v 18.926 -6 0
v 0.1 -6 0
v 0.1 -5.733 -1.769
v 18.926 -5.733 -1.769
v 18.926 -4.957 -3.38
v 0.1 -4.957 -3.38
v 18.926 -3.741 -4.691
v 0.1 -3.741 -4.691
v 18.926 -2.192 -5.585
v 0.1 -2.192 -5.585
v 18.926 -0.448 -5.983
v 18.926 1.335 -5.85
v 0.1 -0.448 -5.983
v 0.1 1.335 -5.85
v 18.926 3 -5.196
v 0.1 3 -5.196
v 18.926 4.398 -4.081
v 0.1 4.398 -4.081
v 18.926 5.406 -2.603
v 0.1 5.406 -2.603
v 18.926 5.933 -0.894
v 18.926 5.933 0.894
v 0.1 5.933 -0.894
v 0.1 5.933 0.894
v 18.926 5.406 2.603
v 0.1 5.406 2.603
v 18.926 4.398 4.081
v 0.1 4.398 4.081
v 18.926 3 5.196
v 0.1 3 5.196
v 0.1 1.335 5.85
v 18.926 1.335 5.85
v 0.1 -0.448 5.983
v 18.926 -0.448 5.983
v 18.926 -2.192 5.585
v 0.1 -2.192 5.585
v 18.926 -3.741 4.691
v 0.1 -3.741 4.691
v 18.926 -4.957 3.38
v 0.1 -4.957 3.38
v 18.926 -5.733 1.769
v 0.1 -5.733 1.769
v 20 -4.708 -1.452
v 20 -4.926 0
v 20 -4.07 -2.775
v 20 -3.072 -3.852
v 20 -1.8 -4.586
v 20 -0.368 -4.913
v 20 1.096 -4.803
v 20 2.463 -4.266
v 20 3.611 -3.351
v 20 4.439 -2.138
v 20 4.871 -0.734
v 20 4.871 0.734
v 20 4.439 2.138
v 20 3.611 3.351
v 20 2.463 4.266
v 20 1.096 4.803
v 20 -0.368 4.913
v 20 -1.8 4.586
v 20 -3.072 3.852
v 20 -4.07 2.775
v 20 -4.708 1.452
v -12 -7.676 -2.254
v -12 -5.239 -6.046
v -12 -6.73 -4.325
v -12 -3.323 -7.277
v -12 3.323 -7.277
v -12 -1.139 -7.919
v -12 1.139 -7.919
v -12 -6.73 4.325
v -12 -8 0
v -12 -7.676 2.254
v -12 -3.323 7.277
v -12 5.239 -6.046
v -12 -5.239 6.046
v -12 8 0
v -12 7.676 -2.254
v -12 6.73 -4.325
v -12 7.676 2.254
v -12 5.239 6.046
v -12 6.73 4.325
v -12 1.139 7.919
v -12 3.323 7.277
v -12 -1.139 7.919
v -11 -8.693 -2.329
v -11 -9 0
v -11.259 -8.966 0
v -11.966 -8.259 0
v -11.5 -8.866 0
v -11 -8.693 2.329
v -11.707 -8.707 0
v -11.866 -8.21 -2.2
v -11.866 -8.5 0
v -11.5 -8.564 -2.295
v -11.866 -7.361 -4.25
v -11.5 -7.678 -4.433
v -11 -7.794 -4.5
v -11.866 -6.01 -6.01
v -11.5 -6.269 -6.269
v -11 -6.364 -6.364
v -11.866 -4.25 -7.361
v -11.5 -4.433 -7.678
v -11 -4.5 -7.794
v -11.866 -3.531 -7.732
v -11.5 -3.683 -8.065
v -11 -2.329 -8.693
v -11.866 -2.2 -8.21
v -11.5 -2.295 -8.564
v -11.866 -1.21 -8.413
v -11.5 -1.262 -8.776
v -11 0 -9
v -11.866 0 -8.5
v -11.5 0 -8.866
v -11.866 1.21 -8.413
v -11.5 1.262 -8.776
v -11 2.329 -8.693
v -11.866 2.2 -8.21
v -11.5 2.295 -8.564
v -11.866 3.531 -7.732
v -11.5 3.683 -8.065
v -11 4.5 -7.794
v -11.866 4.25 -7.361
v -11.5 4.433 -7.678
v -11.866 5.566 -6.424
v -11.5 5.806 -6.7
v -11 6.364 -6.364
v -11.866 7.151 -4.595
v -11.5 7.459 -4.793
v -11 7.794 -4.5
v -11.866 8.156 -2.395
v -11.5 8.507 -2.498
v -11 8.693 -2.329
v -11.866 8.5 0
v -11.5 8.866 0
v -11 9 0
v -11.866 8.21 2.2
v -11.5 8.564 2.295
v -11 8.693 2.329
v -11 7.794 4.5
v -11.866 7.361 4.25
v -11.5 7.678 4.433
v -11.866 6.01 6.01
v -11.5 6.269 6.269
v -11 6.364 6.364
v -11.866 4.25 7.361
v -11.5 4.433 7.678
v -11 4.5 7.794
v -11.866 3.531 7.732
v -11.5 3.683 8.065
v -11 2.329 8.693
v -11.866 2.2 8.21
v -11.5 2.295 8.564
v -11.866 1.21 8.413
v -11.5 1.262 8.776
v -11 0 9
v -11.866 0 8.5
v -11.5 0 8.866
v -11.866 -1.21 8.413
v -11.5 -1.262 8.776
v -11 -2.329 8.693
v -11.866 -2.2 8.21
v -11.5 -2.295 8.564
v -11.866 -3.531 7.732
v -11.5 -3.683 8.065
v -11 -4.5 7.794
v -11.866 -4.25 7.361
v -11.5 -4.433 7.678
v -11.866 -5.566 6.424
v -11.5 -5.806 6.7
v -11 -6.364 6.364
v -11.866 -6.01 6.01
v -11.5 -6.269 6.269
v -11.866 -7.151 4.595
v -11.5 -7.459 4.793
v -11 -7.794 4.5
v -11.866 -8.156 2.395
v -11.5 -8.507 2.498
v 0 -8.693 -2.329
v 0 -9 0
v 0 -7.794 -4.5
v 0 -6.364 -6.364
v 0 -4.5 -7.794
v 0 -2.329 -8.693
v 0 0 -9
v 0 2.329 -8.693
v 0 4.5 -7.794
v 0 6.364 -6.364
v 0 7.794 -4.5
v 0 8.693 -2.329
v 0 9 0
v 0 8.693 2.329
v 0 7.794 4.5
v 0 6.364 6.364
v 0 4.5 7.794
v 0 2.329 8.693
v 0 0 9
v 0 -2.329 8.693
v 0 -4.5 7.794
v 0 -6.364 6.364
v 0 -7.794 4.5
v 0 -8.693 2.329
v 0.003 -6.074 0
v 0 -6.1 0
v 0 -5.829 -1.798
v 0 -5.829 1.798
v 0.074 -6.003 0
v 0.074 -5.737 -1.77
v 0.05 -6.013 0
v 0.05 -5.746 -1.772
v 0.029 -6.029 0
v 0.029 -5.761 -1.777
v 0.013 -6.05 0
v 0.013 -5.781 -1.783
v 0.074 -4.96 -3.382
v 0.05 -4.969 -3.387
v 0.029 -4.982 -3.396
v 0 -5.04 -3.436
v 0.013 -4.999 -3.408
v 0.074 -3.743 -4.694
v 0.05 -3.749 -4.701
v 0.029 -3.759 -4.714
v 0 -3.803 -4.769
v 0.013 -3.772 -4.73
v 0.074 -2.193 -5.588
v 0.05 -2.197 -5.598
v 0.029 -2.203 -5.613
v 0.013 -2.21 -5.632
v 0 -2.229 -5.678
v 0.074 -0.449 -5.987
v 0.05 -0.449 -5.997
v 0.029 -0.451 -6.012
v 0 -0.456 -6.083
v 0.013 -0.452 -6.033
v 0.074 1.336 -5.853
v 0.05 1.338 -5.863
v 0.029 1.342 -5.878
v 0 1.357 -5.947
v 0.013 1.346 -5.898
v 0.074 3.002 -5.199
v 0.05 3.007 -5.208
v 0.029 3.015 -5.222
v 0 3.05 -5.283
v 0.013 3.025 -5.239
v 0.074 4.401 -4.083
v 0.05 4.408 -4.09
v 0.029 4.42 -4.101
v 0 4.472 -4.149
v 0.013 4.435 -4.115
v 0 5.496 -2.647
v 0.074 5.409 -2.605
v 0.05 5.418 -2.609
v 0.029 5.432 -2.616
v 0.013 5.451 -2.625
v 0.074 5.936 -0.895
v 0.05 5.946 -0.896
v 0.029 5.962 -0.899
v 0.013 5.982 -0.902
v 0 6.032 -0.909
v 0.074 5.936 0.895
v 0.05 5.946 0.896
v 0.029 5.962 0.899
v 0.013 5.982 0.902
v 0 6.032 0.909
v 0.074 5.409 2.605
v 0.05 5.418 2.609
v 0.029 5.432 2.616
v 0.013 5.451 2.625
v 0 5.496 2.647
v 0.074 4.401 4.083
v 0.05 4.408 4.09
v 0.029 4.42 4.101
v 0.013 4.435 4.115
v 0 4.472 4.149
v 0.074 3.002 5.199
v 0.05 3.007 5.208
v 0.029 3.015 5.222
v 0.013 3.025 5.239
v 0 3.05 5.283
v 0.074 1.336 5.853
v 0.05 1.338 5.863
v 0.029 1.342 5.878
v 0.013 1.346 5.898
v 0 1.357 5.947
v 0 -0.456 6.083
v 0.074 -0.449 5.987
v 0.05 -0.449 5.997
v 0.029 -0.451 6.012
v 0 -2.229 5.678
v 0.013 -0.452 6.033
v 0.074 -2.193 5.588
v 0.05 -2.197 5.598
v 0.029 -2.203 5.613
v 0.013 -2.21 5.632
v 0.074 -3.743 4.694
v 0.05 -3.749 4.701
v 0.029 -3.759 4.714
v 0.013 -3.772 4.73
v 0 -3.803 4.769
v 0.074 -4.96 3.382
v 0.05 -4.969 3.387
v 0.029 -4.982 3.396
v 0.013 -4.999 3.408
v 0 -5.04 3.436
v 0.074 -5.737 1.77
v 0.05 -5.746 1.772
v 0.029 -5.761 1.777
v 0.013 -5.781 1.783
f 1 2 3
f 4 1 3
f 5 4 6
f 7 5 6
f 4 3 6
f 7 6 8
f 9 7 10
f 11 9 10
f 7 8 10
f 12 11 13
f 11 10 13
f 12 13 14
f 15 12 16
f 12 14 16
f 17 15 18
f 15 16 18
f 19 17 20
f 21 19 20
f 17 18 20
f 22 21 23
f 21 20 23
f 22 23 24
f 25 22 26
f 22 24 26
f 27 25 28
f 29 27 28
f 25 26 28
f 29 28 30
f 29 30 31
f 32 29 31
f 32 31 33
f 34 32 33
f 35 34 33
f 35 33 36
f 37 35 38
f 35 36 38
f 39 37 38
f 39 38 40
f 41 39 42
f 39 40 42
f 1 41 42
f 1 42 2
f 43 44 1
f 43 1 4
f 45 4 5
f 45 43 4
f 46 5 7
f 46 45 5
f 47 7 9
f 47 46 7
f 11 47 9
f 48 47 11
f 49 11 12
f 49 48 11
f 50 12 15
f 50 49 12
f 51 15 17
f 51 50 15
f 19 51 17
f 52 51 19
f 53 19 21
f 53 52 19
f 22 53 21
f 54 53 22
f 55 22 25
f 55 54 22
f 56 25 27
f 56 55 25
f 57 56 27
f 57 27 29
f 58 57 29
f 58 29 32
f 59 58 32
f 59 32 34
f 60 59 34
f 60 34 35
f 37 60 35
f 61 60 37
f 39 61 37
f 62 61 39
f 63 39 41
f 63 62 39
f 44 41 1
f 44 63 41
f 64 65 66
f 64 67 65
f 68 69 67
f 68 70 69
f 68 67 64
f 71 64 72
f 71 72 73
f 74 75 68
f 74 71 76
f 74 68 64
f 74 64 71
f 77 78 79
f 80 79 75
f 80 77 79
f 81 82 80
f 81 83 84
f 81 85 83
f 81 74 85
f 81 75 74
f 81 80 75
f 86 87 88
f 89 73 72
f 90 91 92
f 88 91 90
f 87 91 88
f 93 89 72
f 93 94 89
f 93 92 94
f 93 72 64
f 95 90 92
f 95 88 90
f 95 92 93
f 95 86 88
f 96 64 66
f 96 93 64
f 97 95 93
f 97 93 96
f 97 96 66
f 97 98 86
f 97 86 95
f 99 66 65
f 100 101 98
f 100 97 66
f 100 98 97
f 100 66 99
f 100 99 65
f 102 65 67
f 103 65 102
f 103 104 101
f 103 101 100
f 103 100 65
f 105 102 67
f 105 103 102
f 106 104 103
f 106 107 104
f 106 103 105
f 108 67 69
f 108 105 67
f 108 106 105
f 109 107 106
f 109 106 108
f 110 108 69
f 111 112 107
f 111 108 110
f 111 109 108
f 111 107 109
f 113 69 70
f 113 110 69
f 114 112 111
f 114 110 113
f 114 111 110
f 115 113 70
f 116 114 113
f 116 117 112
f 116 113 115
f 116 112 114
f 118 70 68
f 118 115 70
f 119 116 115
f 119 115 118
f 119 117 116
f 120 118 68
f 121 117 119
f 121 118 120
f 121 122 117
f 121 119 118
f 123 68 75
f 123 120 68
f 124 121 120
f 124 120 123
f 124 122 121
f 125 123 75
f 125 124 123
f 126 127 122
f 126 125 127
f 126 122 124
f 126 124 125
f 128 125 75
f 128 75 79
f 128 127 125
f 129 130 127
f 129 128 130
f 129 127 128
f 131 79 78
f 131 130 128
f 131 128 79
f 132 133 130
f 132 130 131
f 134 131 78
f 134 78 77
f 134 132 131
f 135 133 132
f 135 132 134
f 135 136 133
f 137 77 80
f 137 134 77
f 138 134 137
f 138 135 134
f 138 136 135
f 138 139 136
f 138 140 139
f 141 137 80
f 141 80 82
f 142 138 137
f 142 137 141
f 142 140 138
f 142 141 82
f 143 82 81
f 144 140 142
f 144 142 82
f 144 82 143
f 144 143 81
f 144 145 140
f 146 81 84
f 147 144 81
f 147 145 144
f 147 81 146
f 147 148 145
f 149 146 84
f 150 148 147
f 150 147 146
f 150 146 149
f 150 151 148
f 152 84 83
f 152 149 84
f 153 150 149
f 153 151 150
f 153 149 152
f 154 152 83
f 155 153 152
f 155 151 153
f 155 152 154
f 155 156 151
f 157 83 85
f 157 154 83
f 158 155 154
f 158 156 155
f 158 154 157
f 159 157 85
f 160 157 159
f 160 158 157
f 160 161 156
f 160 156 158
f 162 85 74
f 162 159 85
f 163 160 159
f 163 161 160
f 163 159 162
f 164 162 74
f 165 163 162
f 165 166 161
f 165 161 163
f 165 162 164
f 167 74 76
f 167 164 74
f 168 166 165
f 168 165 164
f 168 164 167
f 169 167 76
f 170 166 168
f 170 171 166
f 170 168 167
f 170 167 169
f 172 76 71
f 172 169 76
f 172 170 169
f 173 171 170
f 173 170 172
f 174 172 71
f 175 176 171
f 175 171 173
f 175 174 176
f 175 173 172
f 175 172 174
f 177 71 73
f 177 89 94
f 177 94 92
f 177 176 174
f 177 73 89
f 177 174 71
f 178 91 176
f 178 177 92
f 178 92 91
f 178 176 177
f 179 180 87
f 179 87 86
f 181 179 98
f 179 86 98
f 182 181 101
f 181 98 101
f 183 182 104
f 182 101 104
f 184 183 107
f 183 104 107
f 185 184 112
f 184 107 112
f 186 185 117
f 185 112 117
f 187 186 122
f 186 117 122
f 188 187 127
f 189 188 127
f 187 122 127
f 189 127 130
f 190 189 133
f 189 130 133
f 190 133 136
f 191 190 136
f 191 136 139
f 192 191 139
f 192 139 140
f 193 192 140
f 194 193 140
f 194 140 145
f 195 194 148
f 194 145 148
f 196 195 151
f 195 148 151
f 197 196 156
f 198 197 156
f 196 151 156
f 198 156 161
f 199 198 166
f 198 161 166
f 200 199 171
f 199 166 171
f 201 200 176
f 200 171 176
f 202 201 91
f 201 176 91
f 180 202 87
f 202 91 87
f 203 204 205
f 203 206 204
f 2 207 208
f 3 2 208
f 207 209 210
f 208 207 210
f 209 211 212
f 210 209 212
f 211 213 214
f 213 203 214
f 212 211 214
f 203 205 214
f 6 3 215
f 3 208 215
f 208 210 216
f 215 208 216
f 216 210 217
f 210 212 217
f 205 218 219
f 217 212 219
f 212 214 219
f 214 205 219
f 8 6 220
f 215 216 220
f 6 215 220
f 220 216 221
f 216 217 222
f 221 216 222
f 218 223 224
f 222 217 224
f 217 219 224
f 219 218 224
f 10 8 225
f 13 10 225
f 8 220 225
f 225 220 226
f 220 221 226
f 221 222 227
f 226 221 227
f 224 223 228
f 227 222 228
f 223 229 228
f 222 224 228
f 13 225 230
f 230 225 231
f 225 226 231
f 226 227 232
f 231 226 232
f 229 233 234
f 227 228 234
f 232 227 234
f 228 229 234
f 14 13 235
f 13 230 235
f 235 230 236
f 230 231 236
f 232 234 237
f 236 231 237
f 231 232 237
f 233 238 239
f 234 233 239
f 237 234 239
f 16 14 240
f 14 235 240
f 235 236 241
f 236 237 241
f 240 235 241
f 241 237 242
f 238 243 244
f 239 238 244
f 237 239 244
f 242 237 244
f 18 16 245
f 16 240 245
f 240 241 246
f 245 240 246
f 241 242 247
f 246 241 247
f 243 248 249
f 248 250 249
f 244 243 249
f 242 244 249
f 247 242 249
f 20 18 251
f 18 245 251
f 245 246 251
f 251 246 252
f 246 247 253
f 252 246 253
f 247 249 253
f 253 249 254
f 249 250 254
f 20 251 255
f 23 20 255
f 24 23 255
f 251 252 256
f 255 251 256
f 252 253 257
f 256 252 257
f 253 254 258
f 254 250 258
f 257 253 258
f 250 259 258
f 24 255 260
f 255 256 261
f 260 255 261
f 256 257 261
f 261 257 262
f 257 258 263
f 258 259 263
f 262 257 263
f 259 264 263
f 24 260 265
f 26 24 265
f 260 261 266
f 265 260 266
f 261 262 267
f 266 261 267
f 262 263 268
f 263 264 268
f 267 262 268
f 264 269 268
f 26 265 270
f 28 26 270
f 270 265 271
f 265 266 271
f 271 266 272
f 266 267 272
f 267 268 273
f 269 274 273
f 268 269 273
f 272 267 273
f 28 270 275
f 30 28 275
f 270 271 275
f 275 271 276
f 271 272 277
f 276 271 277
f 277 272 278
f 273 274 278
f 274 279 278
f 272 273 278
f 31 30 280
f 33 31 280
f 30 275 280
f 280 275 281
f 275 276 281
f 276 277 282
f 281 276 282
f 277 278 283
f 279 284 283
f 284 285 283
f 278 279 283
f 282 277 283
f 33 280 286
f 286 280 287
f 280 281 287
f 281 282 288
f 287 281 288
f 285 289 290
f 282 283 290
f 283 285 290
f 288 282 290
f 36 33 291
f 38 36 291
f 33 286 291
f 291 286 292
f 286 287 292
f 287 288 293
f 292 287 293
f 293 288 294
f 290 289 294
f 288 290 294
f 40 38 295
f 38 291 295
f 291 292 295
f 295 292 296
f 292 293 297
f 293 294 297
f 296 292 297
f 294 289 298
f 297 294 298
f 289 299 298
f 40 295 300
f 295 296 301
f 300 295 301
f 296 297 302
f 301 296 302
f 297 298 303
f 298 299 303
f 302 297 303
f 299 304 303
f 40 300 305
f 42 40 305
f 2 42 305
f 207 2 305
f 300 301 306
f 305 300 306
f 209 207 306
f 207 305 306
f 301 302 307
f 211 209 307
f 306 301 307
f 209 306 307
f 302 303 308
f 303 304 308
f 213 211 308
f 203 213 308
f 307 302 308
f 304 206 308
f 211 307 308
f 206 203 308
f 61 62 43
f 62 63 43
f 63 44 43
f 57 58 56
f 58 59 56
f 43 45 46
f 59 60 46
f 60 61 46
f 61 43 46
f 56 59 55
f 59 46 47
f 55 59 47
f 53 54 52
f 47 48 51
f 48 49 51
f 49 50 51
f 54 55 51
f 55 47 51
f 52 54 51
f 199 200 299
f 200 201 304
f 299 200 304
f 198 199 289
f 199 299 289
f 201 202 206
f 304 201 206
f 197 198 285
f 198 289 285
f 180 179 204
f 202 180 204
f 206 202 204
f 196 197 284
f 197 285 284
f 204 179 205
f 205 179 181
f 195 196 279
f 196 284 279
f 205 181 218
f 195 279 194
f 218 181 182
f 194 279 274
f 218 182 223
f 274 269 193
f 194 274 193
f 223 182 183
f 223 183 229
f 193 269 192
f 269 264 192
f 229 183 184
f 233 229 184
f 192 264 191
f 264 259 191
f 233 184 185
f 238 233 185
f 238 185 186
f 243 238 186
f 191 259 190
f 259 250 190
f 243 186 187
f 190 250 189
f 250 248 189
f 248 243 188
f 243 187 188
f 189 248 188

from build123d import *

# Parameters (mm, degrees)
EXTRUDE_562_REACH = 36.438
SKETCH_2_R        = 5.773502692
FILLET_616_R      = 1
CHAMFER_1_SIZE    = 1.0735375
FILLET_2_R        = 0.1


with BuildPart() as part:
    # 草圖1 → Revolve 435 (revolve)
    with BuildSketch(Plane.XY, mode=Mode.PRIVATE) as revolve_435_sk:
        Polygon((-2.066666667, 0), (20, 0), (20, 6), (4.3, 6), (3.2263625, 6), (0, 6), (0, 9), (-12, 9), (-12, 5.773502692), (-5.4, 5.773502692), align=None)
    revolve(revolve_435_sk.sketch.rotate(Axis((-2.066666667, 0, 0), (1, 0, 0)), 180), axis=Axis((-2.066666667, 0, 0), (1, 0, 0)))

    # 草圖2 → Extrude 562 (add, up to next)
    with BuildSketch(Plane.ZY.offset(12), mode=Mode.PRIVATE) as extrude_562_sk1:
        Circle(SKETCH_2_R)
    extrude_562_tool1 = extrude(extrude_562_sk1.sketch, amount=-EXTRUDE_562_REACH, mode=Mode.PRIVATE) - part.part
    # 草圖2 → Extrude 562 (add, up to next)
    with BuildSketch(Plane.ZY.offset(12), mode=Mode.PRIVATE) as extrude_562_sk2:
        Polygon((5.773502692, 0), (2.886751346, -5), (-2.886751346, -5), (-5.773502692, 0), (-2.886751346, 5), (2.886751346, 5), align=None)
    extrude_562_tool2 = extrude(extrude_562_sk2.sketch, amount=-EXTRUDE_562_REACH, mode=Mode.PRIVATE) - part.part
    add(extrude_562_tool1.solids().sort_by_distance((-12, 0, 0))[0])
    add(extrude_562_tool2.solids().sort_by_distance((-12, 0, 0))[0])

    # Fillet 616
    fillet_616_edges = [part.edges().sort_by_distance(p)[0] for p in [
        (-12, 9, 0),
    ]]
    fillet(fillet_616_edges, radius=FILLET_616_R)

    # 倒角1
    chamfer_1_edges = [part.edges().sort_by_distance(p)[0] for p in [
        (20, 6, 0),
    ]]
    chamfer(chamfer_1_edges, length=CHAMFER_1_SIZE)

    # 圓角2
    fillet_2_edges = [part.edges().sort_by_distance(p)[0] for p in [
        (0, 6, 0),
    ]]
    fillet(fillet_2_edges, radius=FILLET_2_R)


solid = part.part
